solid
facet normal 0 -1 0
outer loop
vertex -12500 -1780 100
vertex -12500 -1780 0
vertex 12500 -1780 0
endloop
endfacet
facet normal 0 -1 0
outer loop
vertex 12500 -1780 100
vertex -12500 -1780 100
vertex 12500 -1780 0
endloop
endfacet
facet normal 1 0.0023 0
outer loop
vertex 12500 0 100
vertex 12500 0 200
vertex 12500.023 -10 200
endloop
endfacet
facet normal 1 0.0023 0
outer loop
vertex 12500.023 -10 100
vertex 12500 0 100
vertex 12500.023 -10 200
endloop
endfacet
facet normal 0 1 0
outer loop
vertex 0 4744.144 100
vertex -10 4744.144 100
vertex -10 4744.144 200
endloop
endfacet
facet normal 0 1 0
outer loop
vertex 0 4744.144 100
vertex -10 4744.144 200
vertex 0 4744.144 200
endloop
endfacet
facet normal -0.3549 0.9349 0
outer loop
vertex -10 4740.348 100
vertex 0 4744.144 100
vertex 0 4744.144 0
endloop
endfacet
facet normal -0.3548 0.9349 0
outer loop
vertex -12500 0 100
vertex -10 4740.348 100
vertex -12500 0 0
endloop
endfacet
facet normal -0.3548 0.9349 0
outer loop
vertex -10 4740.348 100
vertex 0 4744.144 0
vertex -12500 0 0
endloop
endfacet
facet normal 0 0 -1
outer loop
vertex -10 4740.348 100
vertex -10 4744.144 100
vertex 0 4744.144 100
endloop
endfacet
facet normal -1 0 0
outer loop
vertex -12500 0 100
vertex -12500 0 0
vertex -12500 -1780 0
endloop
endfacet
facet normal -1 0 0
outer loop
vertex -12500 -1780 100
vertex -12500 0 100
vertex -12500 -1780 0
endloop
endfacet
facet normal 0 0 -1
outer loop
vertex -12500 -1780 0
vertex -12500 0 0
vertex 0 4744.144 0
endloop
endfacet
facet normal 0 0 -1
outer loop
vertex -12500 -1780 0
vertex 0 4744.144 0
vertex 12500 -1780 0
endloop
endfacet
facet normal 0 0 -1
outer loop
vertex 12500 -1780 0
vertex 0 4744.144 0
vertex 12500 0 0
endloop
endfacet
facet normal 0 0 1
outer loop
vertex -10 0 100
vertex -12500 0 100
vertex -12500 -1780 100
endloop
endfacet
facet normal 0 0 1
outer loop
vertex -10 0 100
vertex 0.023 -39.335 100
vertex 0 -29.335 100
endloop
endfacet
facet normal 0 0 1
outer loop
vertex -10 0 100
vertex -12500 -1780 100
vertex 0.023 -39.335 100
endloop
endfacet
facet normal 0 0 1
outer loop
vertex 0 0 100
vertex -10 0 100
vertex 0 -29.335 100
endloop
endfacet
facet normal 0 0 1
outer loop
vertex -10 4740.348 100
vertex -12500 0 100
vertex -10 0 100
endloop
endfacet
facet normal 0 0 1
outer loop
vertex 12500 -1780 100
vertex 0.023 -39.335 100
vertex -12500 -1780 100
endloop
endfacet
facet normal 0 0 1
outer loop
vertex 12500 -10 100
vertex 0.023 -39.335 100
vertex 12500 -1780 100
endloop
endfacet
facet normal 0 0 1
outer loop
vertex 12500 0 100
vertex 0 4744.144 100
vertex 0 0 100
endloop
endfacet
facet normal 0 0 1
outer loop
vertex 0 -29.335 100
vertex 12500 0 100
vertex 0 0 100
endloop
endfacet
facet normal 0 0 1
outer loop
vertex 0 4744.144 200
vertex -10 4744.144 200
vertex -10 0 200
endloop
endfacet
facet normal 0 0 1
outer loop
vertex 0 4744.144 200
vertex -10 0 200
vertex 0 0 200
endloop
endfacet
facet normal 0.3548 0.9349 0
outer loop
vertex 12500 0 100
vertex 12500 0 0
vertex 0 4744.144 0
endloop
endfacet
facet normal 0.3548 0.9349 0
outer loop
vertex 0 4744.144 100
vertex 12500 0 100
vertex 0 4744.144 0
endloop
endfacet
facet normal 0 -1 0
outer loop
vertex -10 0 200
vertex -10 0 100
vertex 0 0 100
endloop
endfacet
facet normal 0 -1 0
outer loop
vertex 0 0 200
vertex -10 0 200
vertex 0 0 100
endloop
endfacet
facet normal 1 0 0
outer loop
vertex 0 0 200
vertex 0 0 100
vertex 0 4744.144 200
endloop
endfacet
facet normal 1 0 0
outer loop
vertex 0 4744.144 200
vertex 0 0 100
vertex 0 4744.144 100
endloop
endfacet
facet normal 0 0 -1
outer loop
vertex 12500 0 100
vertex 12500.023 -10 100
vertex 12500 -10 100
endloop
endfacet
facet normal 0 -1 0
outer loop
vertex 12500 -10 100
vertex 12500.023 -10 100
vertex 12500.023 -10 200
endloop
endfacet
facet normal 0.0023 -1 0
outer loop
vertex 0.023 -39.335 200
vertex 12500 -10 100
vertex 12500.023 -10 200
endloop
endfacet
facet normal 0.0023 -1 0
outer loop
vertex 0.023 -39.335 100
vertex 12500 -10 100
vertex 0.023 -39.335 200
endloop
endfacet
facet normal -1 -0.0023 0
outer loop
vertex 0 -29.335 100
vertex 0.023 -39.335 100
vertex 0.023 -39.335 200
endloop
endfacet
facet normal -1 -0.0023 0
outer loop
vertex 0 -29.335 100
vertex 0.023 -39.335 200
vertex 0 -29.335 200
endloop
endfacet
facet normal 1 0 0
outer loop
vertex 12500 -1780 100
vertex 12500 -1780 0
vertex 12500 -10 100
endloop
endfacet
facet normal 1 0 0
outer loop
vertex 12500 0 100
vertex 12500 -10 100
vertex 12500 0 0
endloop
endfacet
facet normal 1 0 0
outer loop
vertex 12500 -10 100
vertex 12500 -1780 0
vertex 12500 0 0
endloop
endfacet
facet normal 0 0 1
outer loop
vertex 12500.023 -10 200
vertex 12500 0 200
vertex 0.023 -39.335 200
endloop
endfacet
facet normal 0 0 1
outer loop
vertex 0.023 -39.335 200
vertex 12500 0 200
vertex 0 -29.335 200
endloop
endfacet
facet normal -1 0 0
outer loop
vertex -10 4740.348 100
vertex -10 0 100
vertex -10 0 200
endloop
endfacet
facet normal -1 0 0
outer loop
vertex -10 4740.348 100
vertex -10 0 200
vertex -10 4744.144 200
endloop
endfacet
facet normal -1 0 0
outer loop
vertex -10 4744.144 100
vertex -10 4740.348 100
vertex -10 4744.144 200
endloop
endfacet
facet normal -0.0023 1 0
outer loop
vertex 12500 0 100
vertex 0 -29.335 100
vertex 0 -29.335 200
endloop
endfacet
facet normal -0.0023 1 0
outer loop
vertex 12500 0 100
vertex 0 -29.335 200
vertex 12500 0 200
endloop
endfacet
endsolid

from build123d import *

# Parameters (mm, degrees)
SALIENTE_EXTRUIR1_DEPTH = 100
CROQUIS6_W              = 10
CROQUIS6_H              = 4744.143758361
EXTRUIR_L_MINA1_DEPTH   = 100


with BuildPart() as part:
    # Croquis5 → Saliente-Extruir1 (new body)
    with BuildSketch(Plane.XY):
        Polygon((12500, 0), (0, 4744.143758361), (-12500, 0), (-12500, -1780), (12500, -1780), align=None)
    extrude(amount=SALIENTE_EXTRUIR1_DEPTH)

    # Croquis6 → Extruir-Lámina1 (add)
    with BuildSketch(Plane.XY.offset(100)):
        with Locations((-5, 2372.071879181)):
            Rectangle(CROQUIS6_W, CROQUIS6_H)
        Polygon((0, -29.334752026), (12500, 0), (12500.023467737, -9.999972463), (0.023467737, -39.334724489), align=None)
    extrude(amount=EXTRUIR_L_MINA1_DEPTH)


solid = part.part
